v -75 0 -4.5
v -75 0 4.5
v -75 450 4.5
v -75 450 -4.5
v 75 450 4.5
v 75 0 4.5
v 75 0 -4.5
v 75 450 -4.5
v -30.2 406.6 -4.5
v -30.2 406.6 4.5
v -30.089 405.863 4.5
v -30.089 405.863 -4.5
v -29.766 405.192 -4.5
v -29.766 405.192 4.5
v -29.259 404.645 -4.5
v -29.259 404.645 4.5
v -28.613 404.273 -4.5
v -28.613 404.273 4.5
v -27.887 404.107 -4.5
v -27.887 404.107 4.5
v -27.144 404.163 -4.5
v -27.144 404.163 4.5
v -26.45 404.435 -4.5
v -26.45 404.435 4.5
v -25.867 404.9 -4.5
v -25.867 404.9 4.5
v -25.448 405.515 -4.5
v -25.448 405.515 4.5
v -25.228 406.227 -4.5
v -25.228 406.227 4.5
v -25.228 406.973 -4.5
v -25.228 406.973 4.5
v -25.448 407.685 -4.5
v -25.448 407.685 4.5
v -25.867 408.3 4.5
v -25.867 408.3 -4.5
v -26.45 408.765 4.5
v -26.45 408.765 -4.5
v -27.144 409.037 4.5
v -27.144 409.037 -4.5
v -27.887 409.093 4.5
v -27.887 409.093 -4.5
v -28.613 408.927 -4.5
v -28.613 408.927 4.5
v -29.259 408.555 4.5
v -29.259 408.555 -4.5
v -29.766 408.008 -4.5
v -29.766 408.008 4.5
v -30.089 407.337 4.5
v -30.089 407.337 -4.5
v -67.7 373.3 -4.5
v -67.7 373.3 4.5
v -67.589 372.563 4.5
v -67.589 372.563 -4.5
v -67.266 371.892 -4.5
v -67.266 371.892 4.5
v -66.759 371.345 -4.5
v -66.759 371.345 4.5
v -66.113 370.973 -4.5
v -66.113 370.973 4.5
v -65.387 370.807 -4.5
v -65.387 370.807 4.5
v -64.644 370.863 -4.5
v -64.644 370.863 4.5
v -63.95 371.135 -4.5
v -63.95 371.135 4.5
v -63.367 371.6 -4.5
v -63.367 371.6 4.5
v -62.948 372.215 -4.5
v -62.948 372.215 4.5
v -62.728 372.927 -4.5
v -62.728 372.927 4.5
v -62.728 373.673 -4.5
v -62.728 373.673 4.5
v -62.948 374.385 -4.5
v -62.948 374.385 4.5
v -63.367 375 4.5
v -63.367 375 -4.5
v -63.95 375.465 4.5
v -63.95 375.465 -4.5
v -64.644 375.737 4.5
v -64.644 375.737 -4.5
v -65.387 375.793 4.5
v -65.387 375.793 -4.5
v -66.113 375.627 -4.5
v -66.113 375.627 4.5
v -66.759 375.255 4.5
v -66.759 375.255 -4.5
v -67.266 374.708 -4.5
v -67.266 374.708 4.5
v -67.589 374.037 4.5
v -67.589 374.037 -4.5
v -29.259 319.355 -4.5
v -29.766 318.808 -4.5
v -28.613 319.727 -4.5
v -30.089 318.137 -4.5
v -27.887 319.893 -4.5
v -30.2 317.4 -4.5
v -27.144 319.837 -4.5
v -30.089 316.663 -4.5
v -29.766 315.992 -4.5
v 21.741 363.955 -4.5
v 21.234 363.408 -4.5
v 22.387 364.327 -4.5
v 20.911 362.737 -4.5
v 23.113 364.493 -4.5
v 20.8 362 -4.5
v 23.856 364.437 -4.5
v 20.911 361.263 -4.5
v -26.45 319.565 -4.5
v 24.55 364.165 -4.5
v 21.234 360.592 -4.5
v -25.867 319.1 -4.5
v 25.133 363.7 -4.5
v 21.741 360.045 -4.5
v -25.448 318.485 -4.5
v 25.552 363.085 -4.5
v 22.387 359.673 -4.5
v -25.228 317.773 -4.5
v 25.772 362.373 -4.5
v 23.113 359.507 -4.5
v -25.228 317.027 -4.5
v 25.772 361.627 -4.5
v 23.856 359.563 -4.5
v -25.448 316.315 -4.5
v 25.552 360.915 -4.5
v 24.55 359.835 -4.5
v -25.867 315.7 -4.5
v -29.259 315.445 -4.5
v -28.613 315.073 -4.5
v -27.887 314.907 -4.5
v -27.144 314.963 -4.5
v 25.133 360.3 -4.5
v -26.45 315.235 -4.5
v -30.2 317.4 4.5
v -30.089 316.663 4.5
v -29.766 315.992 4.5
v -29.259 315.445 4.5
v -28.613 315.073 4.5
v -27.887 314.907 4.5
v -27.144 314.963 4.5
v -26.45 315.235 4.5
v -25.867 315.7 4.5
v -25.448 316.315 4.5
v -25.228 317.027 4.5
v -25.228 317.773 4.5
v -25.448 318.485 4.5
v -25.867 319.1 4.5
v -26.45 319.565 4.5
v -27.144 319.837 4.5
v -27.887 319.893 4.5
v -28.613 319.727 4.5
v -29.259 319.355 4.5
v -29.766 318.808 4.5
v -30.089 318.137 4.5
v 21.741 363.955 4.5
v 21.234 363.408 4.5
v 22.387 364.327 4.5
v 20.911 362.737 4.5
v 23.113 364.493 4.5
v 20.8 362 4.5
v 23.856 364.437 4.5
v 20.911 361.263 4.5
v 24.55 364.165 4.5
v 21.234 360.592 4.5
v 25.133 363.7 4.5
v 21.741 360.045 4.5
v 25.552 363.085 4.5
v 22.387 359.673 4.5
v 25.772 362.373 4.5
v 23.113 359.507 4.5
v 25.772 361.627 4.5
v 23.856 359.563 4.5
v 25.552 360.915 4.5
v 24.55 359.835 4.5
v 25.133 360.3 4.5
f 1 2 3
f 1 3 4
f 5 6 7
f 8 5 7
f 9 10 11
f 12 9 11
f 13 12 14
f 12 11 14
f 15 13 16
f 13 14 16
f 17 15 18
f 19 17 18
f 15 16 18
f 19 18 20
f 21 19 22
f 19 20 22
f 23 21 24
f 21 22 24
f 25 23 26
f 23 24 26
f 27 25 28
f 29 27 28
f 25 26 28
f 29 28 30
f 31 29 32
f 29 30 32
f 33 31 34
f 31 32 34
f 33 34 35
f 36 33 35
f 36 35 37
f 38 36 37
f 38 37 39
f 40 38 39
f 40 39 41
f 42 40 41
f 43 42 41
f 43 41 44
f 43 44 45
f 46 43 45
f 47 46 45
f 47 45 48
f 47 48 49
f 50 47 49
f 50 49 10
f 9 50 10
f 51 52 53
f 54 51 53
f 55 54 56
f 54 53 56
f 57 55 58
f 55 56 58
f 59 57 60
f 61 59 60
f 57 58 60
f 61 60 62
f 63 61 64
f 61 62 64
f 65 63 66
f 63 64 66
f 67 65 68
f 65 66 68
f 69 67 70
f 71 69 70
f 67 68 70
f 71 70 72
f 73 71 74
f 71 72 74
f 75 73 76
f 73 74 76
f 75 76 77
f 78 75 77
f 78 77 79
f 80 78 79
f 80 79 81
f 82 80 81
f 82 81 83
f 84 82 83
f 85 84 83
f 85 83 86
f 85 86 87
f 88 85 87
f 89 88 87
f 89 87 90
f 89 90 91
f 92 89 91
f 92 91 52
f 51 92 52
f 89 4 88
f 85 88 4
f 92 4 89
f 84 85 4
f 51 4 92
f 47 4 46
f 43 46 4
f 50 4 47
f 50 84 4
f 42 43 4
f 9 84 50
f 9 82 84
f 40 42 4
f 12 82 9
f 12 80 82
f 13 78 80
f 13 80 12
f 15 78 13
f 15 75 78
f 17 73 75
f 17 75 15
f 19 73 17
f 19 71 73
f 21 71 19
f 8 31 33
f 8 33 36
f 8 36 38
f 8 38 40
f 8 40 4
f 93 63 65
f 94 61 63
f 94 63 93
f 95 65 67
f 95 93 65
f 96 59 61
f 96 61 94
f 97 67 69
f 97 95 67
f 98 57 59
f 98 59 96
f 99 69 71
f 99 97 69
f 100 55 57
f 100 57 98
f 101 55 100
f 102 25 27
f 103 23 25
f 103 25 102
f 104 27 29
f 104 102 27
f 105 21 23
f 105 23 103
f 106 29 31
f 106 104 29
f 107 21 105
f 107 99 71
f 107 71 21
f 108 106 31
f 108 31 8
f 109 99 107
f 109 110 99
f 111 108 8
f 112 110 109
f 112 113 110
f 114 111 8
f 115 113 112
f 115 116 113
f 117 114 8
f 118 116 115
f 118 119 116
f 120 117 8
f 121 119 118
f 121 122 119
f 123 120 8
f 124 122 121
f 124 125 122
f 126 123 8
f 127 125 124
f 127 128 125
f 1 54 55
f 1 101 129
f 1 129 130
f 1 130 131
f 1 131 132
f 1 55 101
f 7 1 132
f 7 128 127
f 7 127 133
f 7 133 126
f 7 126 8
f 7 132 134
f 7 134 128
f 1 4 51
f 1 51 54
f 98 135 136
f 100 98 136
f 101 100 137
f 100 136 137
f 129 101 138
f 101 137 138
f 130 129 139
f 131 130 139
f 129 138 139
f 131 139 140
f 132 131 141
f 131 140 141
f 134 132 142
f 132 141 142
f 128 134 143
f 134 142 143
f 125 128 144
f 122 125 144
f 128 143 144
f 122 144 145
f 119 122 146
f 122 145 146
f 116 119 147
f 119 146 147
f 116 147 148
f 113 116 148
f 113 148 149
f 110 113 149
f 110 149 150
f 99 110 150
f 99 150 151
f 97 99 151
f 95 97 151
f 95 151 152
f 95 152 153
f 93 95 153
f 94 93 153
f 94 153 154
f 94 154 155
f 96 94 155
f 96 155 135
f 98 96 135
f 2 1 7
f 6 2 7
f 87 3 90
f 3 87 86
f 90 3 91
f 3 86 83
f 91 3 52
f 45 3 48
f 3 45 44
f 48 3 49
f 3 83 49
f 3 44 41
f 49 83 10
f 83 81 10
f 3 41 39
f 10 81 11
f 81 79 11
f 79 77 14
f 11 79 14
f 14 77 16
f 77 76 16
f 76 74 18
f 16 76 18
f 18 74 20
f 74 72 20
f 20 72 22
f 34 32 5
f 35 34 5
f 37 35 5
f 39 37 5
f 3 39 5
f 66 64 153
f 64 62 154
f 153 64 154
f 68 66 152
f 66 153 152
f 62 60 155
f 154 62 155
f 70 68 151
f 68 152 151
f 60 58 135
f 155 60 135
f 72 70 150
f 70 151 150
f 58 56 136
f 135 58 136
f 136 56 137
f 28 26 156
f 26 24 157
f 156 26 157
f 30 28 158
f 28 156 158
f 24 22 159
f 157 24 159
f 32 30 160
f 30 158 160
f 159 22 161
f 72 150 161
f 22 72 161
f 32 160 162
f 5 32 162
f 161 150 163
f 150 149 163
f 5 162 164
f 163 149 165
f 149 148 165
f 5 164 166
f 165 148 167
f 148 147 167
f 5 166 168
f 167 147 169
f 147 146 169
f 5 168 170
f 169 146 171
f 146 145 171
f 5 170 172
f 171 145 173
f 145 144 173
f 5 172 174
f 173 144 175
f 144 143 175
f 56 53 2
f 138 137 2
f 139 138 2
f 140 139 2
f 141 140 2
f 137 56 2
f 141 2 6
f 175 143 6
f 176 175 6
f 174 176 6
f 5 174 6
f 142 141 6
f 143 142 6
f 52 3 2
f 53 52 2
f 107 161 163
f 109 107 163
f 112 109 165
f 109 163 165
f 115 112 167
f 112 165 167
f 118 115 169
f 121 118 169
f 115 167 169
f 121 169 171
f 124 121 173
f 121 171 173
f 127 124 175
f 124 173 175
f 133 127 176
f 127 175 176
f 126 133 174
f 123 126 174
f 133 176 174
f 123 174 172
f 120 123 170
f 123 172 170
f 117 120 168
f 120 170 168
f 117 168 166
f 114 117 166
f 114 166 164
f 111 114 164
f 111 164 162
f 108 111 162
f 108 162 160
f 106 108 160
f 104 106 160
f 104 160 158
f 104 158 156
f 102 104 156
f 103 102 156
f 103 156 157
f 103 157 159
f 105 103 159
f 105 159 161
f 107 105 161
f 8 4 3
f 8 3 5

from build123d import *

# Parameters (mm, degrees)
SKETCH1_W                      = 150
SKETCH1_H                      = 9
BOSS_EXTRUDE1_DEPTH            = 450
CUT_EXTRUDE1_REACH             = 458.296
SKETCH2_R                      = 2.5
CUT_EXTRUDE1_DIRECTION_2_DEPTH = 457.29595659


with BuildPart() as part:
    # Sketch1 → Boss-Extrude1 (new body)
    with BuildSketch(Plane(origin=(0, 0, 0), x_dir=(1, 0, 0), z_dir=(0, 1, 0))):
        Rectangle(SKETCH1_W, SKETCH1_H)
    extrude(amount=BOSS_EXTRUDE1_DEPTH)

    # Sketch2 → Cut-Extrude1 (cut, up to next)
    with BuildSketch(Plane.XY.offset(4.5), mode=Mode.PRIVATE) as cut_extrude1_sk1:
        with Locations(Location((-27.7, 406.6, 0), (0, 0, 180))):
            Circle(SKETCH2_R)
    cut_extrude1_tool1 = extrude(cut_extrude1_sk1.sketch, amount=-CUT_EXTRUDE1_REACH, mode=Mode.PRIVATE) & part.part
    # Sketch2 → Cut-Extrude1 (cut, up to next)
    with BuildSketch(Plane.XY.offset(4.5), mode=Mode.PRIVATE) as cut_extrude1_sk2:
        with Locations(Location((-27.7, 317.4, 0), (0, 0, 180))):
            Circle(SKETCH2_R)
    cut_extrude1_tool2 = extrude(cut_extrude1_sk2.sketch, amount=-CUT_EXTRUDE1_REACH, mode=Mode.PRIVATE) & part.part
    # Sketch2 → Cut-Extrude1 (cut, up to next)
    with BuildSketch(Plane.XY.offset(4.5), mode=Mode.PRIVATE) as cut_extrude1_sk3:
        with Locations(Location((23.3, 362, 0), (0, 0, 180))):
            Circle(SKETCH2_R)
    cut_extrude1_tool3 = extrude(cut_extrude1_sk3.sketch, amount=-CUT_EXTRUDE1_REACH, mode=Mode.PRIVATE) & part.part
    # Sketch2 → Cut-Extrude1 (cut, up to next)
    with BuildSketch(Plane.XY.offset(4.5), mode=Mode.PRIVATE) as cut_extrude1_sk4:
        with Locations(Location((-65.2, 373.3, 0), (0, 0, 180))):
            Circle(SKETCH2_R)
    cut_extrude1_tool4 = extrude(cut_extrude1_sk4.sketch, amount=-CUT_EXTRUDE1_REACH, mode=Mode.PRIVATE) & part.part
    add(cut_extrude1_tool1.solids().sort_by_distance((-27.7, 406.6, 4.5))[0], mode=Mode.SUBTRACT)
    add(cut_extrude1_tool2.solids().sort_by_distance((-27.7, 317.4, 4.5))[0], mode=Mode.SUBTRACT)
    add(cut_extrude1_tool3.solids().sort_by_distance((23.3, 362, 4.5))[0], mode=Mode.SUBTRACT)
    add(cut_extrude1_tool4.solids().sort_by_distance((-65.2, 373.3, 4.5))[0], mode=Mode.SUBTRACT)

    # Sketch2 → Cut-Extrude1 direction 2 (cut)
    with BuildSketch(Plane.XY.offset(4.5)):
        with Locations(Location((-27.7, 406.6, 0), (0, 0, 180))):
            Circle(SKETCH2_R)
        with Locations(Location((-27.7, 317.4, 0), (0, 0, 180))):
            Circle(SKETCH2_R)
        with Locations(Location((23.3, 362, 0), (0, 0, 180))):
            Circle(SKETCH2_R)
        with Locations(Location((-65.2, 373.3, 0), (0, 0, 180))):
            Circle(SKETCH2_R)
    extrude(amount=CUT_EXTRUDE1_DIRECTION_2_DEPTH, mode=Mode.SUBTRACT)


solid = part.part
